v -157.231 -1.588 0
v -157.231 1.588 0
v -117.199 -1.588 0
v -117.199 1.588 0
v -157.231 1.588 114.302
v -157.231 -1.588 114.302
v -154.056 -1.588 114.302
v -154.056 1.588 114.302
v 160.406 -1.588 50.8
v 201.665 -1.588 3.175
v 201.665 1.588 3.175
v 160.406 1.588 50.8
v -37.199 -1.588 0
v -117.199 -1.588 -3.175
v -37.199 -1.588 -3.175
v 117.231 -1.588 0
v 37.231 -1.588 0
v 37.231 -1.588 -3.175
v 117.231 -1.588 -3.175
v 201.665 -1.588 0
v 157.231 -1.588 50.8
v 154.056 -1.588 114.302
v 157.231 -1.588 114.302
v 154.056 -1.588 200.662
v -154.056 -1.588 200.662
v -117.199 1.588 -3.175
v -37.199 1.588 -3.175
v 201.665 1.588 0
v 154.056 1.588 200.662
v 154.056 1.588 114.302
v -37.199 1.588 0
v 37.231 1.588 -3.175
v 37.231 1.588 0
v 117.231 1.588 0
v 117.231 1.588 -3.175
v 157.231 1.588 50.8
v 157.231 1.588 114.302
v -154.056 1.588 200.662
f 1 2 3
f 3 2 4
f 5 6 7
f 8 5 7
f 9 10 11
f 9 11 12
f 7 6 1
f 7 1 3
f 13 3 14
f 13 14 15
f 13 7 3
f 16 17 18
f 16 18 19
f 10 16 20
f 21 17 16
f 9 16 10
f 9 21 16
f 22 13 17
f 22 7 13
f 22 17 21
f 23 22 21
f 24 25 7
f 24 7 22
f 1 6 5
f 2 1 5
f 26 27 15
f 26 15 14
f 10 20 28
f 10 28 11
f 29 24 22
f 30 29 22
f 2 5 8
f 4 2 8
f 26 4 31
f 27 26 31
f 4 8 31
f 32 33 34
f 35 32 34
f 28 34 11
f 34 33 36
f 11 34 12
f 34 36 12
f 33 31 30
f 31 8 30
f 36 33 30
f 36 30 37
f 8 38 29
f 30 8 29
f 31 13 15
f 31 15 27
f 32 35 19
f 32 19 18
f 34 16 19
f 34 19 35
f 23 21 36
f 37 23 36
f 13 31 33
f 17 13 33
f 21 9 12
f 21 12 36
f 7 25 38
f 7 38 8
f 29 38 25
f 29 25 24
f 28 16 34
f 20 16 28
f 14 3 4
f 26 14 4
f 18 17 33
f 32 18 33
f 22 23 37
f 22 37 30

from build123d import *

# Parameters (mm, degrees)
SKETCH1_W           = 314.4612
SKETCH1_H           = 3.175
BOSS_EXTRUDE1_DEPTH = 200.66180012
CUT_EXTRUDE2_START  = -3.175
SKETCH5_W           = 3.175
SKETCH5_H           = 86.36
CUT_EXTRUDE2_DEPTH  = 259.119504214
SKETCH3_W           = 80
SKETCH3_H           = 3.175
BOSS_EXTRUDE2_DEPTH = 3.175
LPATTERN2_COUNT     = 2
LPATTERN2_PITCH     = 154.43
BOSS_EXTRUDE3_DEPTH = 3.175


with BuildPart() as part:
    # Sketch1 → Boss-Extrude1 (new body)
    with BuildSketch(Plane.XY):
        Rectangle(SKETCH1_W, SKETCH1_H)
    extrude(amount=BOSS_EXTRUDE1_DEPTH)

    # Sketch5 → Cut-Extrude2 (cut)
    with BuildSketch(Plane(origin=(0, 1.5875, 0), x_dir=(1, 0, 0), z_dir=(0, 1, 0)).offset(CUT_EXTRUDE2_START)):
        with Locations((-155.6431, -157.48180012)):
            Rectangle(SKETCH5_W, SKETCH5_H)
    cut_extrude2 = extrude(amount=CUT_EXTRUDE2_DEPTH, mode=Mode.SUBTRACT)

    # Mirror1: Cut-Extrude2 across plane
    add(cut_extrude2.mirror(Plane(origin=(0, 0, 0), x_dir=(0, 0, 1), z_dir=(1, 0, 0))), mode=Mode.SUBTRACT)

    # Sketch3 → Boss-Extrude2 (add)
    with BuildSketch(Plane(origin=(0, 0, 0), x_dir=(-1, 0, 0), z_dir=(0, 0, -1))):
        with Locations((-77.2306, 0)):
            Rectangle(SKETCH3_W, SKETCH3_H)
    boss_extrude2 = extrude(amount=BOSS_EXTRUDE2_DEPTH)

    # LPattern2: Boss-Extrude2 ×2
    with Locations(*[(-i * LPATTERN2_PITCH, 0, 0) for i in range(1, LPATTERN2_COUNT)]):
        add(boss_extrude2)

    # Sketch10 → Boss-Extrude3 (add)
    with BuildSketch(Plane.XZ.offset(1.5875)):
        Polygon((201.66536, 0), (201.66536, 3.175), (160.4056, 50.8), (157.2306, 50.8), (157.2306, 0), align=None)
    extrude(amount=-BOSS_EXTRUDE3_DEPTH)


solid = part.part
